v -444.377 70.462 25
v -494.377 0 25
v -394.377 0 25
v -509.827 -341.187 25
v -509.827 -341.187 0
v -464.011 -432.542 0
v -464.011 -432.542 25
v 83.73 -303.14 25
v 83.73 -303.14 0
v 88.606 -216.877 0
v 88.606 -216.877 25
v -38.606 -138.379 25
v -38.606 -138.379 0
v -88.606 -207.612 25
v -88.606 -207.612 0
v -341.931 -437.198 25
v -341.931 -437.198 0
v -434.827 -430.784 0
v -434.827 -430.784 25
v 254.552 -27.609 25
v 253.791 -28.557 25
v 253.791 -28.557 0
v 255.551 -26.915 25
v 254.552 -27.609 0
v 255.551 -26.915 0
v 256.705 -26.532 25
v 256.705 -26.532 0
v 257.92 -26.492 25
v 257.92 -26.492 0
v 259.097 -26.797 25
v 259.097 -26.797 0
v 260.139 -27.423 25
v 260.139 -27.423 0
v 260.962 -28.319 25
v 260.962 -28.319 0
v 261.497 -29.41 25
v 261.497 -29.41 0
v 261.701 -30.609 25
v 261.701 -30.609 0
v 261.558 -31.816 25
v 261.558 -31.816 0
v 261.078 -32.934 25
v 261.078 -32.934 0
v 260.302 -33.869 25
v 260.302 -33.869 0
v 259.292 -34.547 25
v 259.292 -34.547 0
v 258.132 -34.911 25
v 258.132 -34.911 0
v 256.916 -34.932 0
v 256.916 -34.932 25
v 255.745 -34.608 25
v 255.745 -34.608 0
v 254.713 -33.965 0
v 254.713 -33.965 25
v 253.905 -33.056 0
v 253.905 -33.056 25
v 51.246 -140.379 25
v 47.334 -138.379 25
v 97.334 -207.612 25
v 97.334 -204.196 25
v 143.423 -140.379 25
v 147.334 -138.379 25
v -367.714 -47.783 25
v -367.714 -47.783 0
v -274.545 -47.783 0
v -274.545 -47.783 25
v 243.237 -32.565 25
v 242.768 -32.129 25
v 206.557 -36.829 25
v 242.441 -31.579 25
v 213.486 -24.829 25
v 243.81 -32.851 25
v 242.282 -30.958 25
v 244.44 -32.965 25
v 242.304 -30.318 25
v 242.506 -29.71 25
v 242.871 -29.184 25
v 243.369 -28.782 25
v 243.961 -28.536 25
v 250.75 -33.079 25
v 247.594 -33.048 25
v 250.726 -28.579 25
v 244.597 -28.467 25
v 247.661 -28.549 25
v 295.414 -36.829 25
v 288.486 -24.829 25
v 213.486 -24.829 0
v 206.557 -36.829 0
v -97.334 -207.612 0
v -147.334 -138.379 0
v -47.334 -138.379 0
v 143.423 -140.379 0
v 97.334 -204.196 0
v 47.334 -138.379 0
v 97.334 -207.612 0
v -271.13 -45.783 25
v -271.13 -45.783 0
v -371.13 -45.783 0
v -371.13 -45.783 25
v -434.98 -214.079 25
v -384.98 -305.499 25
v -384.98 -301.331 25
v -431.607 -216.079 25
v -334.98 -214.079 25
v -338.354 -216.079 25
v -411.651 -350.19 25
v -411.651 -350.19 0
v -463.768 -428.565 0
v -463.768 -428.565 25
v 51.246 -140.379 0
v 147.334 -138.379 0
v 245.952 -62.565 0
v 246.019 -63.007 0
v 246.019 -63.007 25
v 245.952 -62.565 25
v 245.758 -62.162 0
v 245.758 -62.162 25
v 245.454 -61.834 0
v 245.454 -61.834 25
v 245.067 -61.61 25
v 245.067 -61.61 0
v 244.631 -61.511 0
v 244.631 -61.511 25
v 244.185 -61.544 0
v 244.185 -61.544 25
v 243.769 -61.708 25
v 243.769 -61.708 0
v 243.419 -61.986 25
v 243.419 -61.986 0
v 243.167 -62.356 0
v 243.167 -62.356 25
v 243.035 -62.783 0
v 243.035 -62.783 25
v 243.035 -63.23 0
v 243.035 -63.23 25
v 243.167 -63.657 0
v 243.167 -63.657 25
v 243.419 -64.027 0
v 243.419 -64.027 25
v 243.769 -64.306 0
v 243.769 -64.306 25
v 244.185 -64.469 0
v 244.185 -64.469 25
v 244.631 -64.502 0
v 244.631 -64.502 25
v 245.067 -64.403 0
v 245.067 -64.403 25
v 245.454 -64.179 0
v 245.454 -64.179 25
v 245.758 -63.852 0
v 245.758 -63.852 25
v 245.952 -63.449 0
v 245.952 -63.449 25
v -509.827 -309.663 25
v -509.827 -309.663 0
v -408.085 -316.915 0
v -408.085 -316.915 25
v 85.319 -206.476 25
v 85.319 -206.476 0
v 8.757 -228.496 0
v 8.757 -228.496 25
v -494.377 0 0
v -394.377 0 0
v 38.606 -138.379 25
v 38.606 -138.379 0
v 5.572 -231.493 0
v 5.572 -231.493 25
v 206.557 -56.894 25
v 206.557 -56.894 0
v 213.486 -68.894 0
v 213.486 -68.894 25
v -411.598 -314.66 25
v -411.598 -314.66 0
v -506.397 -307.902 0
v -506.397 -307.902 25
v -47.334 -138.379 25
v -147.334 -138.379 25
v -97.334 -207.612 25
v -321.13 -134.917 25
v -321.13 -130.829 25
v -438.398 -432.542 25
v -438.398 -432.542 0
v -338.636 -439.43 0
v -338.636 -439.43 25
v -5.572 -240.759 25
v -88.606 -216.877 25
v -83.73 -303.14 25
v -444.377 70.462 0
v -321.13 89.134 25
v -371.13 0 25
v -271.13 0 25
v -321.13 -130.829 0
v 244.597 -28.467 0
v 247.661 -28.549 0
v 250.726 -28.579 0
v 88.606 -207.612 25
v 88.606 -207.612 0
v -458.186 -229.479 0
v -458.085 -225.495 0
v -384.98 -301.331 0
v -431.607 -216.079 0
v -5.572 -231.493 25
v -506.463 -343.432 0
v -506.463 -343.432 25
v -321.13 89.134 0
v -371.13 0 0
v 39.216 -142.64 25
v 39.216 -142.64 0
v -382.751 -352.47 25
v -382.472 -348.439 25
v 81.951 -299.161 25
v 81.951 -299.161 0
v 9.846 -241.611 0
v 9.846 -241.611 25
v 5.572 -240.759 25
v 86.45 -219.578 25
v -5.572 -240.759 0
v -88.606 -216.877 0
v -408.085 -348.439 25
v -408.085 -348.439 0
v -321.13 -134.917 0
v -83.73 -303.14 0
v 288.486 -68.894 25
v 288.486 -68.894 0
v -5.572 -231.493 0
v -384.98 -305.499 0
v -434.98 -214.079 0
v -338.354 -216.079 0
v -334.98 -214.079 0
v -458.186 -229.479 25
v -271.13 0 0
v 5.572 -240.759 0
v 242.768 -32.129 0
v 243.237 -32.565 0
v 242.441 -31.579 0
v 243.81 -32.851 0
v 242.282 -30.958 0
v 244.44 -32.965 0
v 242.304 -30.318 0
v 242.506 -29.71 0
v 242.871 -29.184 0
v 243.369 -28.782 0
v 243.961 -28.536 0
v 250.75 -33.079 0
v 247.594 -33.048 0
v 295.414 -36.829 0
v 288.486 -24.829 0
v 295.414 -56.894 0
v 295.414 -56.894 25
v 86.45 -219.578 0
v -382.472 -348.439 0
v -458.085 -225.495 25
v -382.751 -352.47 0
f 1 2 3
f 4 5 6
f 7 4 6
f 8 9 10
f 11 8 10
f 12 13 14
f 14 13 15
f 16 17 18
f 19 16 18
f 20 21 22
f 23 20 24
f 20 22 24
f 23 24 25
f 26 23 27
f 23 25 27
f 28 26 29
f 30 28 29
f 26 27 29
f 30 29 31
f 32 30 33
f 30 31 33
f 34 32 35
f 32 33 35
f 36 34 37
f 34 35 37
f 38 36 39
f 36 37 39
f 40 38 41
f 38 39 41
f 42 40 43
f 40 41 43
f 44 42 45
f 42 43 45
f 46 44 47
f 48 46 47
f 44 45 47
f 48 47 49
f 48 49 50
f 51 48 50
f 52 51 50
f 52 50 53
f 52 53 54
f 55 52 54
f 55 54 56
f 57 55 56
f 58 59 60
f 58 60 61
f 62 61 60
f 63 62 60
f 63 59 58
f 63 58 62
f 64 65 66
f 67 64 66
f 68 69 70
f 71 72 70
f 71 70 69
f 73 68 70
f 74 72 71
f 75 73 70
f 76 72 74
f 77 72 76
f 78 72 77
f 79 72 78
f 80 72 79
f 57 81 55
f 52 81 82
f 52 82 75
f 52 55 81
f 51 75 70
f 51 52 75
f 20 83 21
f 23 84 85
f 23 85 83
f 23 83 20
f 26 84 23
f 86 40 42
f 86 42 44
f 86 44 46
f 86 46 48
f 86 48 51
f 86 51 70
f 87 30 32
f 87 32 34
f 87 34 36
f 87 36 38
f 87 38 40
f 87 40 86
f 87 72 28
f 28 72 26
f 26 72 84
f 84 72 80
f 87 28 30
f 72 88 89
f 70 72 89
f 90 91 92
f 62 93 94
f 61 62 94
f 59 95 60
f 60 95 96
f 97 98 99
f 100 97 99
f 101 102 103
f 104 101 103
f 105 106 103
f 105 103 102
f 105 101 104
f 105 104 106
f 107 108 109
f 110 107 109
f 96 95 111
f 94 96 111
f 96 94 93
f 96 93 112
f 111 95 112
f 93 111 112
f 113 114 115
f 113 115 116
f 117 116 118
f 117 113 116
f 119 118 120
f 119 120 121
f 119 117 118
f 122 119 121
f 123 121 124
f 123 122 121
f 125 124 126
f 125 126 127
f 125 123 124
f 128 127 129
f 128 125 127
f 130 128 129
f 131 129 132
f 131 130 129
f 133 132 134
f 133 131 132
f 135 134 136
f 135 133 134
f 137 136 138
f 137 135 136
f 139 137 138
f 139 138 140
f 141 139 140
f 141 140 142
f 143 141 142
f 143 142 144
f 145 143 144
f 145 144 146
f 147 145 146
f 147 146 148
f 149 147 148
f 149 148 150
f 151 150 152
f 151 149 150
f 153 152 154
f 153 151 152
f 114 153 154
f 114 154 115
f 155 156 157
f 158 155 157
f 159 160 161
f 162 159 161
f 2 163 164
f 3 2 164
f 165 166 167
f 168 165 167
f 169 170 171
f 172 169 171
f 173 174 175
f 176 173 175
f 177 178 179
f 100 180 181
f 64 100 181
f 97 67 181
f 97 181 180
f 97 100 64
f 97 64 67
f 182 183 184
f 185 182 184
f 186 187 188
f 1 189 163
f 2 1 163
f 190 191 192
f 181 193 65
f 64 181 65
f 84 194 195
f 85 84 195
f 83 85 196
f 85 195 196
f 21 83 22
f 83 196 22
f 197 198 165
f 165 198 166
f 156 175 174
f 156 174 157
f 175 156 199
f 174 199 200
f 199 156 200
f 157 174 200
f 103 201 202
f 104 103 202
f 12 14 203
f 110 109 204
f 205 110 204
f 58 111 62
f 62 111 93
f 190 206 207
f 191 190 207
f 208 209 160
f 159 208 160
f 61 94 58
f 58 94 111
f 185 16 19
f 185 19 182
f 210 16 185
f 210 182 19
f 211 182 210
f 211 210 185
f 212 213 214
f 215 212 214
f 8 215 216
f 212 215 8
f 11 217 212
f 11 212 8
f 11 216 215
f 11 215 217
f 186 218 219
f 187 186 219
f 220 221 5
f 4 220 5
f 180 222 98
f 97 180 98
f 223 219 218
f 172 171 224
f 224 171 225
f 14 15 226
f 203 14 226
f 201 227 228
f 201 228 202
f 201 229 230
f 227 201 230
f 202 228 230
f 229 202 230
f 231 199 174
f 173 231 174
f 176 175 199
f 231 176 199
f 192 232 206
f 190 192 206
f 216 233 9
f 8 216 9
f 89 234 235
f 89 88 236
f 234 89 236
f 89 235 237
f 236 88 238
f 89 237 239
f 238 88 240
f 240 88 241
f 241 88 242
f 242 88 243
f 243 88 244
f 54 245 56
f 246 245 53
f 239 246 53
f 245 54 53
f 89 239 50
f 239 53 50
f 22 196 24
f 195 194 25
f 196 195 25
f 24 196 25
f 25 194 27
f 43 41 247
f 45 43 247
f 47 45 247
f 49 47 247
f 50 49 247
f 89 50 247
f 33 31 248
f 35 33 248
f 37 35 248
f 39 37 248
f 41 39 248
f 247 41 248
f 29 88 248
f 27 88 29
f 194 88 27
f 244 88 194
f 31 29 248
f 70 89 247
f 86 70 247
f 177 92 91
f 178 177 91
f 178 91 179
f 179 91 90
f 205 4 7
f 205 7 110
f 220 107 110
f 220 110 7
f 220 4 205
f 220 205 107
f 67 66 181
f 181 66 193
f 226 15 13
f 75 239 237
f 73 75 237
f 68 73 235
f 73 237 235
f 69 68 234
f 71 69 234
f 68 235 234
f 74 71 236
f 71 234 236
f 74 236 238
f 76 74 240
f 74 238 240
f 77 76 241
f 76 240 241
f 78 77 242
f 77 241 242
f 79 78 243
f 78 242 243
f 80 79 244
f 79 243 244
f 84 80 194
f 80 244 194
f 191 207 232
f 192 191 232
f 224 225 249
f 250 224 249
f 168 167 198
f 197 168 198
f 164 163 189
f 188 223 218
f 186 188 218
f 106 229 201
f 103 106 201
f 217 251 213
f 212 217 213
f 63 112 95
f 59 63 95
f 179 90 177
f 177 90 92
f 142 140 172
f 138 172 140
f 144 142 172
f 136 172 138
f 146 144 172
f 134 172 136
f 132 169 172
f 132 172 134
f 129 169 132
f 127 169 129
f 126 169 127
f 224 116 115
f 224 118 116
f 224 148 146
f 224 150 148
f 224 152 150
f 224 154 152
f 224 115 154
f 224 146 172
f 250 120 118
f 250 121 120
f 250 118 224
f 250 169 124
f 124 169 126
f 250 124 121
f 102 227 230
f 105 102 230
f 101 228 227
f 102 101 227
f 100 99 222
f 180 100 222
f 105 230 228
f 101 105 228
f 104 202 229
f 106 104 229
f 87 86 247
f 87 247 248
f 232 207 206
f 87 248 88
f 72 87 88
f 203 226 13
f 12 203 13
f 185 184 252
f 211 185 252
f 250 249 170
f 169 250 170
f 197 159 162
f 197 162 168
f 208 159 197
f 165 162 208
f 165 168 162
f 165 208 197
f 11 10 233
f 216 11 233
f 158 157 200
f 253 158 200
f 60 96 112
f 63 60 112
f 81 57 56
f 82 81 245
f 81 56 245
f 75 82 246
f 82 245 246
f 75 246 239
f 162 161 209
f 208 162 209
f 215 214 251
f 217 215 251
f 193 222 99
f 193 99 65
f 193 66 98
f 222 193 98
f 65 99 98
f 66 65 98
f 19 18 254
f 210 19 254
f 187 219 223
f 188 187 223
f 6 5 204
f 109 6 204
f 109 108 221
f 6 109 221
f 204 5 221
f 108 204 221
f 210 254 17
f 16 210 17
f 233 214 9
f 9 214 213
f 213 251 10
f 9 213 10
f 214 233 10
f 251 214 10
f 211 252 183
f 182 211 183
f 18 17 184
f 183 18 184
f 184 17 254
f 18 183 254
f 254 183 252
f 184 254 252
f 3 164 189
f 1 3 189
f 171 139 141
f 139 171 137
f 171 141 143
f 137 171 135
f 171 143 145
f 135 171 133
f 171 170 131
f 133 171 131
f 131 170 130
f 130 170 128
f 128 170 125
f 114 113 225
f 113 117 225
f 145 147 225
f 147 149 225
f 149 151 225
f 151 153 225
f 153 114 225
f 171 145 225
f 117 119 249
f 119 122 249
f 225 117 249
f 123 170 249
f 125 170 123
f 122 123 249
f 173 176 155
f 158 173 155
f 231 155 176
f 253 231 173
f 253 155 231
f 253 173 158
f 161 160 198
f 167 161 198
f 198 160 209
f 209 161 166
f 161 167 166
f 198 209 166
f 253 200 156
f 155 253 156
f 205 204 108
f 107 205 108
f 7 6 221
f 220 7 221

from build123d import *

# Parameters (mm, degrees)
F0_R     = 1.5
F1_DEPTH = 25


with BuildPart() as f1:
    # F0 (on Top) → F1 (new body)
    with BuildSketch(Plane.XY):
        Polygon((-444.376796, 70.462472), (-494.376796, 0), (-394.376796, 0), align=None)
        Polygon((-321.12956, 89.133832), (-371.12956, 0), (-271.12956, 0), align=None)
        Polygon((-271.12956, -45.783076), (-371.12956, -45.783076), (-321.12956, -134.916908), align=None)
        Polygon((-321.12956, -130.828908), (-367.714471, -47.783076), (-274.54465, -47.783076), align=None, mode=Mode.SUBTRACT)
        Polygon((-509.826546, -309.663062), (-408.084696, -316.915376), (-458.084696, -225.495247), align=None)
        Polygon((-458.185719, -229.478538), (-411.597872, -314.659877), (-506.396546, -307.902483), align=None, mode=Mode.SUBTRACT)
        Polygon((-384.980112, -305.499285), (-334.980112, -214.079156), (-434.980112, -214.079156), align=None)
        Polygon((-384.980112, -301.331285), (-431.606676, -216.079156), (-338.353549, -216.079156), align=None, mode=Mode.SUBTRACT)
        Polygon((-464.010746, -432.542231), (-408.084696, -348.439455), (-509.826546, -341.187141), align=None)
        Polygon((-411.650805, -350.190332), (-463.767898, -428.565118), (-506.46332, -343.431951), align=None, mode=Mode.SUBTRACT)
        Polygon((-338.635849, -439.430486), (-382.472277, -348.439455), (-438.398327, -432.542231), align=None)
        Polygon((-434.82735, -430.784033), (-382.750562, -352.469859), (-341.931296, -437.198185), align=None, mode=Mode.SUBTRACT)
        Polygon((-47.334168, -138.378977), (-147.334168, -138.378977), (-97.334168, -207.611628), align=None)
        Polygon((-38.605976, -138.378977), (-88.605976, -207.611628), (-5.571965, -231.492854), align=None)
        Polygon((-5.571965, -240.7586), (-88.605976, -216.877374), (-83.729527, -303.13965), align=None)
        Polygon((38.605976, -138.378977), (5.571965, -231.492854), (88.605976, -207.611628), align=None)
        Polygon((39.216369, -142.640159), (85.318765, -206.475981), (8.757428, -228.495615), align=None, mode=Mode.SUBTRACT)
        Polygon((147.334168, -138.378977), (47.334168, -138.378977), (97.334168, -207.611628), align=None)
        Polygon((97.334168, -204.195628), (51.245617, -140.378977), (143.422718, -140.378977), align=None, mode=Mode.SUBTRACT)
        Polygon((88.605976, -216.877374), (5.571965, -240.7586), (83.729527, -303.13965), align=None)
        Polygon((9.845506, -241.610571), (86.450087, -219.578499), (81.951228, -299.161376), align=None, mode=Mode.SUBTRACT)
        Polygon((288.485552, -68.893767), (295.413755, -56.893767), (206.557348, -56.893767), (213.485552, -68.893767), align=None)
        with Locations((244.518675, -63.006647)):
            Circle(F0_R, mode=Mode.SUBTRACT)
        Polygon((288.485552, -24.828822), (213.485552, -24.828822), (206.557348, -36.828822), (295.413755, -36.828822), align=None)
        with BuildLine():
            ThreePointArc((253.791441, -28.557316), (261.701081, -30.60895), (253.904732, -33.056103))
            ThreePointArc((253.904732, -33.056103), (249.171864, -33.070052), (244.440151, -32.964572))
            ThreePointArc((244.440151, -32.964572), (242.270046, -30.637419), (244.597199, -28.467313))
            ThreePointArc((244.597199, -28.467313), (249.193754, -28.570052), (253.791441, -28.557316))
        make_face(mode=Mode.SUBTRACT)
    extrude(amount=F1_DEPTH)


solid = f1.part
